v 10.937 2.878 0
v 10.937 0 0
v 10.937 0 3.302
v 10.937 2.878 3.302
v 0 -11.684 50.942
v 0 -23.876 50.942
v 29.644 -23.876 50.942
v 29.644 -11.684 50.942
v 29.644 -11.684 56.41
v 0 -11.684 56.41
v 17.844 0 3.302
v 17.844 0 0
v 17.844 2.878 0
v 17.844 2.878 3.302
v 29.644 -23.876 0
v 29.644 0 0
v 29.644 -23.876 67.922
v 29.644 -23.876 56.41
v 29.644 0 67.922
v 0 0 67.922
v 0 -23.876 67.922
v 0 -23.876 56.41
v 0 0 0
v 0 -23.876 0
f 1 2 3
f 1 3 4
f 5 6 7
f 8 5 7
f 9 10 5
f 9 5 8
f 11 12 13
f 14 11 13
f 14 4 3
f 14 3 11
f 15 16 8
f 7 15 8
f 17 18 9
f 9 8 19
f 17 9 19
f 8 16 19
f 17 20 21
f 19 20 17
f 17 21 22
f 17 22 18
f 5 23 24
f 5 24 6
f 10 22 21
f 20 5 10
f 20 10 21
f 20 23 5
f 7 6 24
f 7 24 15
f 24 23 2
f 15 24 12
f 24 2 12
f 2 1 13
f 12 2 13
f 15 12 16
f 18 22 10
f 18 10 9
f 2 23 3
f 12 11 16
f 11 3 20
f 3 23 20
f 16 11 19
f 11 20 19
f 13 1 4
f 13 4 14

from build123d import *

# Parameters (mm, degrees)
F0_W     = 29.6439956874
F0_H     = 67.9221600294
F1_DEPTH = 23.876
F2_W     = 29.6439956874
F2_H     = 5.4683089256
F3_DEPTH = 40.64
F4_DEPTH = 28.956
F5_W     = 6.9073364139
F5_H     = 2.8780577704
F6_DEPTH = 3.302


with BuildPart() as f1:
    # F0 (on Front) → F1 (new body)
    with BuildSketch(Plane.XZ):
        with Locations((14.8219978437, 33.9610800147)):
            Rectangle(F0_W, F0_H)
    extrude(amount=F1_DEPTH)

    # F2 (on Front) → F3 (join)
    with BuildSketch(Plane.XZ):
        with Locations((14.8219978437, 53.6757744849)):
            Rectangle(F2_W, F2_H)
    extrude(amount=F3_DEPTH)

    # F4 (cut): a face of the model
    f4_faces = [f1.faces().sort_by_distance(p)[0] for p in [
        (14.8219978437, -40.64, 53.6757744849),
    ]]
    extrude(f4_faces, amount=-F4_DEPTH, mode=Mode.SUBTRACT)

    # F5 (on Top) → F6 (join)
    with BuildSketch(Plane.XY):
        with Locations((14.3902879208, 1.4390288852)):
            Rectangle(F5_W, F5_H)
    extrude(amount=F6_DEPTH)


solid = f1.part
